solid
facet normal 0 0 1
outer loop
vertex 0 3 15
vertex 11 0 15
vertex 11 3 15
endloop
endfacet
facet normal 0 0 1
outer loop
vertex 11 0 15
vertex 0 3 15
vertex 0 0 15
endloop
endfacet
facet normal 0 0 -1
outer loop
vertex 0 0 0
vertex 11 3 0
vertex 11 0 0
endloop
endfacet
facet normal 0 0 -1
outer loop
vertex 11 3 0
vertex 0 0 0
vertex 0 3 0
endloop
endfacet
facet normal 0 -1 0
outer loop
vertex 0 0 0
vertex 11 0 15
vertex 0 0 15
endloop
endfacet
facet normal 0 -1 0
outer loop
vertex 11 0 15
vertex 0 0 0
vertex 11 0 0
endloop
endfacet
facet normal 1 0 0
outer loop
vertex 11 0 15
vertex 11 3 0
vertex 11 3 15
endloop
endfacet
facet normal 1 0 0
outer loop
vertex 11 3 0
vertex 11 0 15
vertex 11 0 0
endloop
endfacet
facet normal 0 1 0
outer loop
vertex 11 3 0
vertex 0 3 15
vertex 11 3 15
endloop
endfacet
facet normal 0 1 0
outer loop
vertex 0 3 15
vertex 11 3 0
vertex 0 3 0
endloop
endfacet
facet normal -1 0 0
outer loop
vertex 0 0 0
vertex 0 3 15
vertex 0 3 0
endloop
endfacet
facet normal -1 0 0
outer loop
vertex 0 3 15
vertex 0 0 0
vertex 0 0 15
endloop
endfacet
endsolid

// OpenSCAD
// Generated by SolidPython 1.0.1 on 2020-07-29 00:46:55


cube(size = [11, 3, 15]);
/***********************************************
*********      SolidPython code:      **********
************************************************
 
# import packages: SolidPython
from solid import *
from solid.utils import *
from itertools import chain, combinations, permutations


class Resize:

    def __init__(self, scad_file):
        self.scad_file = scad_file
        #self.scad_file = import_scad(scad_file)
        # cone/cylinder param:
        self.r1 = 0
        self.r2 = 0
        self.h = 0
        # rectangular prism param:
        self.w = 0
        self.l = 0
        # ellipse param:
        self.r = 0

    # import OpenScad code (file name corresponds to shape)


    # classify shape + parameters
    def assign(self, param1, param2, param3):
        if self.scad_file == 'cone.scad':
            self.r1 = param1
            self.r2 = param2
            self.h = param3
        elif self.scad_file == 'cylinder.scad':
            self.r1 = param1
            self.r2 = param2
            self.h = param3
        elif self.scad_file == 'rectangularPrism.scad':
            self.h = param1
            self.l = param2
            self.w = param3
        else:
            self.r = param1
            self.h = param2

    # resize parameters
    def iterate(self):
        x = range(3, 20, 2)
        i = 1
        if self.scad_file == 'cone.scad':
            tempList = list(permutations(x, 2))
            for temp in tempList:
                param1 = temp[0]
                param2 = temp[1]
                filepath = 'produced_scad_files/' + 'cone' + str(param1) + '_' + str(param2) + '_' + '.scad'
                scad_render_to_file(cylinder(h=param1, r1=param2, r2=0), filepath)

        elif self.scad_file == 'cylinder.scad':
            tempList = list(permutations(x, 3))
            for temp in tempList:
                param1 = temp[0]
                param2 = temp[1]
                filepath = 'produced_scad_files/' + 'cylinder' + str(param1) + '_' + str(param2) + '_' + '.scad'
                scad_render_to_file(cylinder(h=param1, r1=param2, r2=param2), filepath)

        elif self.scad_file == 'rectangularPrism.scad':
            tempList = list(permutations(x, 3))
            for temp in tempList:
                param1 = temp[0]
                param2 = temp[1]
                param3 = temp[2]
                filepath = 'produced_scad_files/' + 'rectangularPrism' + str(param1) + '_' + str(param2) + '_' + str(
                    param3) + '.scad'
                scad_render_to_file(cube(size=(param1, param2, param3)), filepath)

        elif self.scad_file == 'ellipse.scad':
            tempList = list(permutations(x, 4))
            for temp in tempList:
                param1 = temp[0]
                param2 = temp[1]
                param3 = temp[2]
                param4 = temp[3]
                filepath = 'produced_scad_files/' + 'ellipse' + str(param1) + '_' + str(param2) + '_' + str(param3) + '_' + str(param4) + '.scad'
                scad_render_to_file(scale([param1, param2, param3])(sphere(r=param4)), filepath)

    def render_to_scadfile(self):
        scad_render_to_file(scad, 'example.scad') 
 
************************************************/
